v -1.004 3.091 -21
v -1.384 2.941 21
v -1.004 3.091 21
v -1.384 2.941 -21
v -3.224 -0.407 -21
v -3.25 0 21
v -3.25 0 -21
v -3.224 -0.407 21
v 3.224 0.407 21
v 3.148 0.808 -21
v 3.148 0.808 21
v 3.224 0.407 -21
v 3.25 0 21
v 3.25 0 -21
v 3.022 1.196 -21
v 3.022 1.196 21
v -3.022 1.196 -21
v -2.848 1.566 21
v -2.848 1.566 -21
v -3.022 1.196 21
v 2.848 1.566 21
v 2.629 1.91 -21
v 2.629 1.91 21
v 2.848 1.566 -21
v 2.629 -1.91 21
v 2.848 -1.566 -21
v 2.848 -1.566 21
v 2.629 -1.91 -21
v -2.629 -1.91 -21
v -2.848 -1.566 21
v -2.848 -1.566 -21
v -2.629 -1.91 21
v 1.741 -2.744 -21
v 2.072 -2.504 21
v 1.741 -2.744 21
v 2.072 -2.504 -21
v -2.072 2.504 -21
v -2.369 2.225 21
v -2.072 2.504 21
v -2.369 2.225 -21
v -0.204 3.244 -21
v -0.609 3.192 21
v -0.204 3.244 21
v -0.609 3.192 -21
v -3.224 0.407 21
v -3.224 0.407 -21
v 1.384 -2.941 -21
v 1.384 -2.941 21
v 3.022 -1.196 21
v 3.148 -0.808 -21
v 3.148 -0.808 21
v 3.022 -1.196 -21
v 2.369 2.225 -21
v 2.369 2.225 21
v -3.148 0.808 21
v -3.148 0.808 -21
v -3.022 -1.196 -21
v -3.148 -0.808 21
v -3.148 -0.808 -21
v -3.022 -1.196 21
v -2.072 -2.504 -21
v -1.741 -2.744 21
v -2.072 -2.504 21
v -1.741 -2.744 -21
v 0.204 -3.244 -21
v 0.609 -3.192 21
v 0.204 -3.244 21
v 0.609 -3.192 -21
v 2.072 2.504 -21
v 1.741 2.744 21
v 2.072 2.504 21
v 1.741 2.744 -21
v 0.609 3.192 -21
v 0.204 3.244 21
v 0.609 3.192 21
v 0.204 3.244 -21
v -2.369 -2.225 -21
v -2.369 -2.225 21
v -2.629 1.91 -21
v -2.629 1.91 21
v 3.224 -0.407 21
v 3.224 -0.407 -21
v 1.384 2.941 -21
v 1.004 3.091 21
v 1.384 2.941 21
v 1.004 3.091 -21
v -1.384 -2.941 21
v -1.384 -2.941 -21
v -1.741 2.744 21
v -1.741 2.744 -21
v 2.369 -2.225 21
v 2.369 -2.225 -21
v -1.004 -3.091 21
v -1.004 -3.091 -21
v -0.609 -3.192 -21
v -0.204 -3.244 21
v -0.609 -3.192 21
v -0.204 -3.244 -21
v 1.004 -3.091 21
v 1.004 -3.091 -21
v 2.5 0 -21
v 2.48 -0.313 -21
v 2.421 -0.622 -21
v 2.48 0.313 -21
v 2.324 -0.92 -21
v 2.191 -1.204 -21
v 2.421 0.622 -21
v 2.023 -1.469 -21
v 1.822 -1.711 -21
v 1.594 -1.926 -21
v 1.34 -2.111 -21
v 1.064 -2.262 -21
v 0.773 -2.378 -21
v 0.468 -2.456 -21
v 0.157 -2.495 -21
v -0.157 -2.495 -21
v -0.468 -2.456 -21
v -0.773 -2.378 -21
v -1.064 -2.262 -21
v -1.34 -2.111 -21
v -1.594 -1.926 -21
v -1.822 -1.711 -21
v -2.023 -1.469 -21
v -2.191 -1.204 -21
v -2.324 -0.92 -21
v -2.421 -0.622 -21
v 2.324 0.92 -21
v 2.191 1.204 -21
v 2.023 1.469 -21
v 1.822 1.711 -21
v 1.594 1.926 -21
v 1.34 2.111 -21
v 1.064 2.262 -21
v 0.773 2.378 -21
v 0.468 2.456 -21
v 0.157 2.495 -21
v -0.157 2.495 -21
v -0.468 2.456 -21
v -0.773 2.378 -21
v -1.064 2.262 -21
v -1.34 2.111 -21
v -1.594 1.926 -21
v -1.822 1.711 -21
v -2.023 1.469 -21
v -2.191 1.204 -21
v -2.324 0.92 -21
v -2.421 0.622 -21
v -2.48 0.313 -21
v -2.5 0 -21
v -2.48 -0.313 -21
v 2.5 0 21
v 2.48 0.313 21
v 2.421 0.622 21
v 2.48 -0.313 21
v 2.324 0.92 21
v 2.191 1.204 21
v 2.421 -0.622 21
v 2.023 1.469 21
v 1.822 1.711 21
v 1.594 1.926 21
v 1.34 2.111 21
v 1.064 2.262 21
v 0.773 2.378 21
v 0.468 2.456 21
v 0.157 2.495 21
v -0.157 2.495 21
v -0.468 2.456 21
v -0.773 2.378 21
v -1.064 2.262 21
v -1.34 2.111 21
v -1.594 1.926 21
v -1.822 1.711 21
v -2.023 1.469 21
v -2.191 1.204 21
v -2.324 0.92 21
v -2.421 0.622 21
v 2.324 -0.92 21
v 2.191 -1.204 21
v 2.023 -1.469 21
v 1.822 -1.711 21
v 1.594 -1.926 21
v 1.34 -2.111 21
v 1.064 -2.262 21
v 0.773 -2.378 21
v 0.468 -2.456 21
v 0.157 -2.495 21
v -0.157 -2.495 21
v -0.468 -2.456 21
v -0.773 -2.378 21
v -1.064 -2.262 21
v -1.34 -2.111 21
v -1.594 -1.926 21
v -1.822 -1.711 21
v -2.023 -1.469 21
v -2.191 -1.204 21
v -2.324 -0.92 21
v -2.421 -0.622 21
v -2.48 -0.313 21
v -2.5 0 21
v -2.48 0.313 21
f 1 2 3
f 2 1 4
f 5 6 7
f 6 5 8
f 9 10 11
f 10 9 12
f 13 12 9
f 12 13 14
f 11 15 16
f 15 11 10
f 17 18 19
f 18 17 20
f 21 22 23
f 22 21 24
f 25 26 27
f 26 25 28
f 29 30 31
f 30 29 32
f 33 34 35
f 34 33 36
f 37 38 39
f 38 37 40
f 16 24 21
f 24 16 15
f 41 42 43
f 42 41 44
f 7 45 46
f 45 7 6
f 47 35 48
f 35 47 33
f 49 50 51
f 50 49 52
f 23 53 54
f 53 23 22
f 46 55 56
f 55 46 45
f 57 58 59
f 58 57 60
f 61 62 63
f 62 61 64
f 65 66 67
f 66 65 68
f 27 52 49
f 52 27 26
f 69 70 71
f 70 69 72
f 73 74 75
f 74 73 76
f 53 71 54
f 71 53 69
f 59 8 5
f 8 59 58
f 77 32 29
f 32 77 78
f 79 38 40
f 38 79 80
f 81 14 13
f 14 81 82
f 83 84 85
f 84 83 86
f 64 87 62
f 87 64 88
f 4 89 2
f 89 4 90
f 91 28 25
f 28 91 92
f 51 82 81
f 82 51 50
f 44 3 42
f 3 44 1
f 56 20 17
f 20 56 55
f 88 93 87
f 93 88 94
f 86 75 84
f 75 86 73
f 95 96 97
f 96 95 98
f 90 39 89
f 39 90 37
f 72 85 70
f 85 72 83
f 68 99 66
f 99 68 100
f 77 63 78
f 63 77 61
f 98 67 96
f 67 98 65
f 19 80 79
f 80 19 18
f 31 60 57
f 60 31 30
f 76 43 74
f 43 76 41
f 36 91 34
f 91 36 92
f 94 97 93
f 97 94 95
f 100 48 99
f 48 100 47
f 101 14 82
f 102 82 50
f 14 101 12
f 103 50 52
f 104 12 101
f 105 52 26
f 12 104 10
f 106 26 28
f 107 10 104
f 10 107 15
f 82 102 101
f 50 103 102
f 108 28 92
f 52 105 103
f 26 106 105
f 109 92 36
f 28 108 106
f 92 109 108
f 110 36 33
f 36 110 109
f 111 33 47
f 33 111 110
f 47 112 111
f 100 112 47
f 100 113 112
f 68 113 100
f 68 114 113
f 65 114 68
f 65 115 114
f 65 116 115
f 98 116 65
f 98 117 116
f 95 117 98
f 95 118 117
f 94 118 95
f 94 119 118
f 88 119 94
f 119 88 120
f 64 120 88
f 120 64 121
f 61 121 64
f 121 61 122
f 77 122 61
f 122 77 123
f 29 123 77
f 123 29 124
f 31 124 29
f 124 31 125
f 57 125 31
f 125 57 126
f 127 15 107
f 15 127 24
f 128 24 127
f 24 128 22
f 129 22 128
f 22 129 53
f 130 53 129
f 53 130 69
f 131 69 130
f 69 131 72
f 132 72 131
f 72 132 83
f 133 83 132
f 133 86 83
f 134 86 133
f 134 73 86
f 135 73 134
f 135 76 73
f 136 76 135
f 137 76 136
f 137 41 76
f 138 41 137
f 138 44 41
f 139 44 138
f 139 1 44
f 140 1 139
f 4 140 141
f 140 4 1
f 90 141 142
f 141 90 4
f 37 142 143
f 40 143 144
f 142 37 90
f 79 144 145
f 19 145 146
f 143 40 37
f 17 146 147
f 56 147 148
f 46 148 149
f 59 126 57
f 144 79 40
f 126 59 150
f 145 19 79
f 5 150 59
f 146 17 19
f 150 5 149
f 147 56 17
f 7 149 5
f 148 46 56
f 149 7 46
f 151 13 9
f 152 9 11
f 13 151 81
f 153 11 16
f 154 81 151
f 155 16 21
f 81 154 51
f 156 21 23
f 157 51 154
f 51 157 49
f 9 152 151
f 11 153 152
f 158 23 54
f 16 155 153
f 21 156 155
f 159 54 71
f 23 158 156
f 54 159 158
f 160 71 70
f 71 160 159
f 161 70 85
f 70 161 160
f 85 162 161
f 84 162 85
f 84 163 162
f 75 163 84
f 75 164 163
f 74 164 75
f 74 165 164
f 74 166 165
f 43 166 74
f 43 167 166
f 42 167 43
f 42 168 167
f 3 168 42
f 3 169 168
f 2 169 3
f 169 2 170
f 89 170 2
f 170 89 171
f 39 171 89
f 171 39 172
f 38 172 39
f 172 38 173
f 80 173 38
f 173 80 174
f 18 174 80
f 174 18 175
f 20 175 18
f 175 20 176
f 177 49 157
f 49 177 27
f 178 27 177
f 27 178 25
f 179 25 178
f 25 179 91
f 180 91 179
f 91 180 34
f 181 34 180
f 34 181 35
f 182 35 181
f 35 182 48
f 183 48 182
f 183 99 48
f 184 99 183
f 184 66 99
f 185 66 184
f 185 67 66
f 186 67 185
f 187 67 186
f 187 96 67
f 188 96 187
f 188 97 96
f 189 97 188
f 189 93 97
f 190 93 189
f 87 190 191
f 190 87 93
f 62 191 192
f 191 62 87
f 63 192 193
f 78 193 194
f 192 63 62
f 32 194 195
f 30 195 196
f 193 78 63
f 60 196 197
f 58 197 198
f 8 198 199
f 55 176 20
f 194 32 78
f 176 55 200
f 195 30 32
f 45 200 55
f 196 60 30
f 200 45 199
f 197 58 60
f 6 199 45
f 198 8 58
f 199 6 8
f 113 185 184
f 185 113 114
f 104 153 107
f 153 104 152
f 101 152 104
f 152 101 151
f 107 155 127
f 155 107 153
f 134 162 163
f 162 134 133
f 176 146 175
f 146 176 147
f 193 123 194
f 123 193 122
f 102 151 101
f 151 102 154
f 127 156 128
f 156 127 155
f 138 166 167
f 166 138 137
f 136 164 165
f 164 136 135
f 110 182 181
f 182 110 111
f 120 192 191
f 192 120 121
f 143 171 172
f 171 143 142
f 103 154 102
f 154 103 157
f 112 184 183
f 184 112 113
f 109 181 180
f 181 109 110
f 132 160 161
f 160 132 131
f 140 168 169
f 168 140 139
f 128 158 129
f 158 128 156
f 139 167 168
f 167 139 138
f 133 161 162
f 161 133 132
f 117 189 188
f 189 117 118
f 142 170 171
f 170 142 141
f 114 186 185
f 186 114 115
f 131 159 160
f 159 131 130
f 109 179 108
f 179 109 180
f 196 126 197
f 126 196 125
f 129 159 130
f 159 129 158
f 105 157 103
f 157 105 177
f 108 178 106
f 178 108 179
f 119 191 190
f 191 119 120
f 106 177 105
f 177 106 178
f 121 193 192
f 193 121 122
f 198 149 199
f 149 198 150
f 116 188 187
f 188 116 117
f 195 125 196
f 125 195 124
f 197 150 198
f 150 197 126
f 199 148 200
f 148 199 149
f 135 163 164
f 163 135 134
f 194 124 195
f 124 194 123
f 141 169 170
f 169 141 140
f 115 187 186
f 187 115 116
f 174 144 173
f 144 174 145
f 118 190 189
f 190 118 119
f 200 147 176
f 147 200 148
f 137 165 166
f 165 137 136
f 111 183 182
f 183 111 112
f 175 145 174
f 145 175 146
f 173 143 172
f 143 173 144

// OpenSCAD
$fn = 50;


difference() {
	union() {
		translate(v = [0, 0, -21.0000000000]) {
			cylinder(h = 42, r = 3.2500000000);
		}
	}
	union() {
		translate(v = [0, 0, -100.0000000000]) {
			cylinder(h = 200, r = 2.5000000000);
		}
	}
}
